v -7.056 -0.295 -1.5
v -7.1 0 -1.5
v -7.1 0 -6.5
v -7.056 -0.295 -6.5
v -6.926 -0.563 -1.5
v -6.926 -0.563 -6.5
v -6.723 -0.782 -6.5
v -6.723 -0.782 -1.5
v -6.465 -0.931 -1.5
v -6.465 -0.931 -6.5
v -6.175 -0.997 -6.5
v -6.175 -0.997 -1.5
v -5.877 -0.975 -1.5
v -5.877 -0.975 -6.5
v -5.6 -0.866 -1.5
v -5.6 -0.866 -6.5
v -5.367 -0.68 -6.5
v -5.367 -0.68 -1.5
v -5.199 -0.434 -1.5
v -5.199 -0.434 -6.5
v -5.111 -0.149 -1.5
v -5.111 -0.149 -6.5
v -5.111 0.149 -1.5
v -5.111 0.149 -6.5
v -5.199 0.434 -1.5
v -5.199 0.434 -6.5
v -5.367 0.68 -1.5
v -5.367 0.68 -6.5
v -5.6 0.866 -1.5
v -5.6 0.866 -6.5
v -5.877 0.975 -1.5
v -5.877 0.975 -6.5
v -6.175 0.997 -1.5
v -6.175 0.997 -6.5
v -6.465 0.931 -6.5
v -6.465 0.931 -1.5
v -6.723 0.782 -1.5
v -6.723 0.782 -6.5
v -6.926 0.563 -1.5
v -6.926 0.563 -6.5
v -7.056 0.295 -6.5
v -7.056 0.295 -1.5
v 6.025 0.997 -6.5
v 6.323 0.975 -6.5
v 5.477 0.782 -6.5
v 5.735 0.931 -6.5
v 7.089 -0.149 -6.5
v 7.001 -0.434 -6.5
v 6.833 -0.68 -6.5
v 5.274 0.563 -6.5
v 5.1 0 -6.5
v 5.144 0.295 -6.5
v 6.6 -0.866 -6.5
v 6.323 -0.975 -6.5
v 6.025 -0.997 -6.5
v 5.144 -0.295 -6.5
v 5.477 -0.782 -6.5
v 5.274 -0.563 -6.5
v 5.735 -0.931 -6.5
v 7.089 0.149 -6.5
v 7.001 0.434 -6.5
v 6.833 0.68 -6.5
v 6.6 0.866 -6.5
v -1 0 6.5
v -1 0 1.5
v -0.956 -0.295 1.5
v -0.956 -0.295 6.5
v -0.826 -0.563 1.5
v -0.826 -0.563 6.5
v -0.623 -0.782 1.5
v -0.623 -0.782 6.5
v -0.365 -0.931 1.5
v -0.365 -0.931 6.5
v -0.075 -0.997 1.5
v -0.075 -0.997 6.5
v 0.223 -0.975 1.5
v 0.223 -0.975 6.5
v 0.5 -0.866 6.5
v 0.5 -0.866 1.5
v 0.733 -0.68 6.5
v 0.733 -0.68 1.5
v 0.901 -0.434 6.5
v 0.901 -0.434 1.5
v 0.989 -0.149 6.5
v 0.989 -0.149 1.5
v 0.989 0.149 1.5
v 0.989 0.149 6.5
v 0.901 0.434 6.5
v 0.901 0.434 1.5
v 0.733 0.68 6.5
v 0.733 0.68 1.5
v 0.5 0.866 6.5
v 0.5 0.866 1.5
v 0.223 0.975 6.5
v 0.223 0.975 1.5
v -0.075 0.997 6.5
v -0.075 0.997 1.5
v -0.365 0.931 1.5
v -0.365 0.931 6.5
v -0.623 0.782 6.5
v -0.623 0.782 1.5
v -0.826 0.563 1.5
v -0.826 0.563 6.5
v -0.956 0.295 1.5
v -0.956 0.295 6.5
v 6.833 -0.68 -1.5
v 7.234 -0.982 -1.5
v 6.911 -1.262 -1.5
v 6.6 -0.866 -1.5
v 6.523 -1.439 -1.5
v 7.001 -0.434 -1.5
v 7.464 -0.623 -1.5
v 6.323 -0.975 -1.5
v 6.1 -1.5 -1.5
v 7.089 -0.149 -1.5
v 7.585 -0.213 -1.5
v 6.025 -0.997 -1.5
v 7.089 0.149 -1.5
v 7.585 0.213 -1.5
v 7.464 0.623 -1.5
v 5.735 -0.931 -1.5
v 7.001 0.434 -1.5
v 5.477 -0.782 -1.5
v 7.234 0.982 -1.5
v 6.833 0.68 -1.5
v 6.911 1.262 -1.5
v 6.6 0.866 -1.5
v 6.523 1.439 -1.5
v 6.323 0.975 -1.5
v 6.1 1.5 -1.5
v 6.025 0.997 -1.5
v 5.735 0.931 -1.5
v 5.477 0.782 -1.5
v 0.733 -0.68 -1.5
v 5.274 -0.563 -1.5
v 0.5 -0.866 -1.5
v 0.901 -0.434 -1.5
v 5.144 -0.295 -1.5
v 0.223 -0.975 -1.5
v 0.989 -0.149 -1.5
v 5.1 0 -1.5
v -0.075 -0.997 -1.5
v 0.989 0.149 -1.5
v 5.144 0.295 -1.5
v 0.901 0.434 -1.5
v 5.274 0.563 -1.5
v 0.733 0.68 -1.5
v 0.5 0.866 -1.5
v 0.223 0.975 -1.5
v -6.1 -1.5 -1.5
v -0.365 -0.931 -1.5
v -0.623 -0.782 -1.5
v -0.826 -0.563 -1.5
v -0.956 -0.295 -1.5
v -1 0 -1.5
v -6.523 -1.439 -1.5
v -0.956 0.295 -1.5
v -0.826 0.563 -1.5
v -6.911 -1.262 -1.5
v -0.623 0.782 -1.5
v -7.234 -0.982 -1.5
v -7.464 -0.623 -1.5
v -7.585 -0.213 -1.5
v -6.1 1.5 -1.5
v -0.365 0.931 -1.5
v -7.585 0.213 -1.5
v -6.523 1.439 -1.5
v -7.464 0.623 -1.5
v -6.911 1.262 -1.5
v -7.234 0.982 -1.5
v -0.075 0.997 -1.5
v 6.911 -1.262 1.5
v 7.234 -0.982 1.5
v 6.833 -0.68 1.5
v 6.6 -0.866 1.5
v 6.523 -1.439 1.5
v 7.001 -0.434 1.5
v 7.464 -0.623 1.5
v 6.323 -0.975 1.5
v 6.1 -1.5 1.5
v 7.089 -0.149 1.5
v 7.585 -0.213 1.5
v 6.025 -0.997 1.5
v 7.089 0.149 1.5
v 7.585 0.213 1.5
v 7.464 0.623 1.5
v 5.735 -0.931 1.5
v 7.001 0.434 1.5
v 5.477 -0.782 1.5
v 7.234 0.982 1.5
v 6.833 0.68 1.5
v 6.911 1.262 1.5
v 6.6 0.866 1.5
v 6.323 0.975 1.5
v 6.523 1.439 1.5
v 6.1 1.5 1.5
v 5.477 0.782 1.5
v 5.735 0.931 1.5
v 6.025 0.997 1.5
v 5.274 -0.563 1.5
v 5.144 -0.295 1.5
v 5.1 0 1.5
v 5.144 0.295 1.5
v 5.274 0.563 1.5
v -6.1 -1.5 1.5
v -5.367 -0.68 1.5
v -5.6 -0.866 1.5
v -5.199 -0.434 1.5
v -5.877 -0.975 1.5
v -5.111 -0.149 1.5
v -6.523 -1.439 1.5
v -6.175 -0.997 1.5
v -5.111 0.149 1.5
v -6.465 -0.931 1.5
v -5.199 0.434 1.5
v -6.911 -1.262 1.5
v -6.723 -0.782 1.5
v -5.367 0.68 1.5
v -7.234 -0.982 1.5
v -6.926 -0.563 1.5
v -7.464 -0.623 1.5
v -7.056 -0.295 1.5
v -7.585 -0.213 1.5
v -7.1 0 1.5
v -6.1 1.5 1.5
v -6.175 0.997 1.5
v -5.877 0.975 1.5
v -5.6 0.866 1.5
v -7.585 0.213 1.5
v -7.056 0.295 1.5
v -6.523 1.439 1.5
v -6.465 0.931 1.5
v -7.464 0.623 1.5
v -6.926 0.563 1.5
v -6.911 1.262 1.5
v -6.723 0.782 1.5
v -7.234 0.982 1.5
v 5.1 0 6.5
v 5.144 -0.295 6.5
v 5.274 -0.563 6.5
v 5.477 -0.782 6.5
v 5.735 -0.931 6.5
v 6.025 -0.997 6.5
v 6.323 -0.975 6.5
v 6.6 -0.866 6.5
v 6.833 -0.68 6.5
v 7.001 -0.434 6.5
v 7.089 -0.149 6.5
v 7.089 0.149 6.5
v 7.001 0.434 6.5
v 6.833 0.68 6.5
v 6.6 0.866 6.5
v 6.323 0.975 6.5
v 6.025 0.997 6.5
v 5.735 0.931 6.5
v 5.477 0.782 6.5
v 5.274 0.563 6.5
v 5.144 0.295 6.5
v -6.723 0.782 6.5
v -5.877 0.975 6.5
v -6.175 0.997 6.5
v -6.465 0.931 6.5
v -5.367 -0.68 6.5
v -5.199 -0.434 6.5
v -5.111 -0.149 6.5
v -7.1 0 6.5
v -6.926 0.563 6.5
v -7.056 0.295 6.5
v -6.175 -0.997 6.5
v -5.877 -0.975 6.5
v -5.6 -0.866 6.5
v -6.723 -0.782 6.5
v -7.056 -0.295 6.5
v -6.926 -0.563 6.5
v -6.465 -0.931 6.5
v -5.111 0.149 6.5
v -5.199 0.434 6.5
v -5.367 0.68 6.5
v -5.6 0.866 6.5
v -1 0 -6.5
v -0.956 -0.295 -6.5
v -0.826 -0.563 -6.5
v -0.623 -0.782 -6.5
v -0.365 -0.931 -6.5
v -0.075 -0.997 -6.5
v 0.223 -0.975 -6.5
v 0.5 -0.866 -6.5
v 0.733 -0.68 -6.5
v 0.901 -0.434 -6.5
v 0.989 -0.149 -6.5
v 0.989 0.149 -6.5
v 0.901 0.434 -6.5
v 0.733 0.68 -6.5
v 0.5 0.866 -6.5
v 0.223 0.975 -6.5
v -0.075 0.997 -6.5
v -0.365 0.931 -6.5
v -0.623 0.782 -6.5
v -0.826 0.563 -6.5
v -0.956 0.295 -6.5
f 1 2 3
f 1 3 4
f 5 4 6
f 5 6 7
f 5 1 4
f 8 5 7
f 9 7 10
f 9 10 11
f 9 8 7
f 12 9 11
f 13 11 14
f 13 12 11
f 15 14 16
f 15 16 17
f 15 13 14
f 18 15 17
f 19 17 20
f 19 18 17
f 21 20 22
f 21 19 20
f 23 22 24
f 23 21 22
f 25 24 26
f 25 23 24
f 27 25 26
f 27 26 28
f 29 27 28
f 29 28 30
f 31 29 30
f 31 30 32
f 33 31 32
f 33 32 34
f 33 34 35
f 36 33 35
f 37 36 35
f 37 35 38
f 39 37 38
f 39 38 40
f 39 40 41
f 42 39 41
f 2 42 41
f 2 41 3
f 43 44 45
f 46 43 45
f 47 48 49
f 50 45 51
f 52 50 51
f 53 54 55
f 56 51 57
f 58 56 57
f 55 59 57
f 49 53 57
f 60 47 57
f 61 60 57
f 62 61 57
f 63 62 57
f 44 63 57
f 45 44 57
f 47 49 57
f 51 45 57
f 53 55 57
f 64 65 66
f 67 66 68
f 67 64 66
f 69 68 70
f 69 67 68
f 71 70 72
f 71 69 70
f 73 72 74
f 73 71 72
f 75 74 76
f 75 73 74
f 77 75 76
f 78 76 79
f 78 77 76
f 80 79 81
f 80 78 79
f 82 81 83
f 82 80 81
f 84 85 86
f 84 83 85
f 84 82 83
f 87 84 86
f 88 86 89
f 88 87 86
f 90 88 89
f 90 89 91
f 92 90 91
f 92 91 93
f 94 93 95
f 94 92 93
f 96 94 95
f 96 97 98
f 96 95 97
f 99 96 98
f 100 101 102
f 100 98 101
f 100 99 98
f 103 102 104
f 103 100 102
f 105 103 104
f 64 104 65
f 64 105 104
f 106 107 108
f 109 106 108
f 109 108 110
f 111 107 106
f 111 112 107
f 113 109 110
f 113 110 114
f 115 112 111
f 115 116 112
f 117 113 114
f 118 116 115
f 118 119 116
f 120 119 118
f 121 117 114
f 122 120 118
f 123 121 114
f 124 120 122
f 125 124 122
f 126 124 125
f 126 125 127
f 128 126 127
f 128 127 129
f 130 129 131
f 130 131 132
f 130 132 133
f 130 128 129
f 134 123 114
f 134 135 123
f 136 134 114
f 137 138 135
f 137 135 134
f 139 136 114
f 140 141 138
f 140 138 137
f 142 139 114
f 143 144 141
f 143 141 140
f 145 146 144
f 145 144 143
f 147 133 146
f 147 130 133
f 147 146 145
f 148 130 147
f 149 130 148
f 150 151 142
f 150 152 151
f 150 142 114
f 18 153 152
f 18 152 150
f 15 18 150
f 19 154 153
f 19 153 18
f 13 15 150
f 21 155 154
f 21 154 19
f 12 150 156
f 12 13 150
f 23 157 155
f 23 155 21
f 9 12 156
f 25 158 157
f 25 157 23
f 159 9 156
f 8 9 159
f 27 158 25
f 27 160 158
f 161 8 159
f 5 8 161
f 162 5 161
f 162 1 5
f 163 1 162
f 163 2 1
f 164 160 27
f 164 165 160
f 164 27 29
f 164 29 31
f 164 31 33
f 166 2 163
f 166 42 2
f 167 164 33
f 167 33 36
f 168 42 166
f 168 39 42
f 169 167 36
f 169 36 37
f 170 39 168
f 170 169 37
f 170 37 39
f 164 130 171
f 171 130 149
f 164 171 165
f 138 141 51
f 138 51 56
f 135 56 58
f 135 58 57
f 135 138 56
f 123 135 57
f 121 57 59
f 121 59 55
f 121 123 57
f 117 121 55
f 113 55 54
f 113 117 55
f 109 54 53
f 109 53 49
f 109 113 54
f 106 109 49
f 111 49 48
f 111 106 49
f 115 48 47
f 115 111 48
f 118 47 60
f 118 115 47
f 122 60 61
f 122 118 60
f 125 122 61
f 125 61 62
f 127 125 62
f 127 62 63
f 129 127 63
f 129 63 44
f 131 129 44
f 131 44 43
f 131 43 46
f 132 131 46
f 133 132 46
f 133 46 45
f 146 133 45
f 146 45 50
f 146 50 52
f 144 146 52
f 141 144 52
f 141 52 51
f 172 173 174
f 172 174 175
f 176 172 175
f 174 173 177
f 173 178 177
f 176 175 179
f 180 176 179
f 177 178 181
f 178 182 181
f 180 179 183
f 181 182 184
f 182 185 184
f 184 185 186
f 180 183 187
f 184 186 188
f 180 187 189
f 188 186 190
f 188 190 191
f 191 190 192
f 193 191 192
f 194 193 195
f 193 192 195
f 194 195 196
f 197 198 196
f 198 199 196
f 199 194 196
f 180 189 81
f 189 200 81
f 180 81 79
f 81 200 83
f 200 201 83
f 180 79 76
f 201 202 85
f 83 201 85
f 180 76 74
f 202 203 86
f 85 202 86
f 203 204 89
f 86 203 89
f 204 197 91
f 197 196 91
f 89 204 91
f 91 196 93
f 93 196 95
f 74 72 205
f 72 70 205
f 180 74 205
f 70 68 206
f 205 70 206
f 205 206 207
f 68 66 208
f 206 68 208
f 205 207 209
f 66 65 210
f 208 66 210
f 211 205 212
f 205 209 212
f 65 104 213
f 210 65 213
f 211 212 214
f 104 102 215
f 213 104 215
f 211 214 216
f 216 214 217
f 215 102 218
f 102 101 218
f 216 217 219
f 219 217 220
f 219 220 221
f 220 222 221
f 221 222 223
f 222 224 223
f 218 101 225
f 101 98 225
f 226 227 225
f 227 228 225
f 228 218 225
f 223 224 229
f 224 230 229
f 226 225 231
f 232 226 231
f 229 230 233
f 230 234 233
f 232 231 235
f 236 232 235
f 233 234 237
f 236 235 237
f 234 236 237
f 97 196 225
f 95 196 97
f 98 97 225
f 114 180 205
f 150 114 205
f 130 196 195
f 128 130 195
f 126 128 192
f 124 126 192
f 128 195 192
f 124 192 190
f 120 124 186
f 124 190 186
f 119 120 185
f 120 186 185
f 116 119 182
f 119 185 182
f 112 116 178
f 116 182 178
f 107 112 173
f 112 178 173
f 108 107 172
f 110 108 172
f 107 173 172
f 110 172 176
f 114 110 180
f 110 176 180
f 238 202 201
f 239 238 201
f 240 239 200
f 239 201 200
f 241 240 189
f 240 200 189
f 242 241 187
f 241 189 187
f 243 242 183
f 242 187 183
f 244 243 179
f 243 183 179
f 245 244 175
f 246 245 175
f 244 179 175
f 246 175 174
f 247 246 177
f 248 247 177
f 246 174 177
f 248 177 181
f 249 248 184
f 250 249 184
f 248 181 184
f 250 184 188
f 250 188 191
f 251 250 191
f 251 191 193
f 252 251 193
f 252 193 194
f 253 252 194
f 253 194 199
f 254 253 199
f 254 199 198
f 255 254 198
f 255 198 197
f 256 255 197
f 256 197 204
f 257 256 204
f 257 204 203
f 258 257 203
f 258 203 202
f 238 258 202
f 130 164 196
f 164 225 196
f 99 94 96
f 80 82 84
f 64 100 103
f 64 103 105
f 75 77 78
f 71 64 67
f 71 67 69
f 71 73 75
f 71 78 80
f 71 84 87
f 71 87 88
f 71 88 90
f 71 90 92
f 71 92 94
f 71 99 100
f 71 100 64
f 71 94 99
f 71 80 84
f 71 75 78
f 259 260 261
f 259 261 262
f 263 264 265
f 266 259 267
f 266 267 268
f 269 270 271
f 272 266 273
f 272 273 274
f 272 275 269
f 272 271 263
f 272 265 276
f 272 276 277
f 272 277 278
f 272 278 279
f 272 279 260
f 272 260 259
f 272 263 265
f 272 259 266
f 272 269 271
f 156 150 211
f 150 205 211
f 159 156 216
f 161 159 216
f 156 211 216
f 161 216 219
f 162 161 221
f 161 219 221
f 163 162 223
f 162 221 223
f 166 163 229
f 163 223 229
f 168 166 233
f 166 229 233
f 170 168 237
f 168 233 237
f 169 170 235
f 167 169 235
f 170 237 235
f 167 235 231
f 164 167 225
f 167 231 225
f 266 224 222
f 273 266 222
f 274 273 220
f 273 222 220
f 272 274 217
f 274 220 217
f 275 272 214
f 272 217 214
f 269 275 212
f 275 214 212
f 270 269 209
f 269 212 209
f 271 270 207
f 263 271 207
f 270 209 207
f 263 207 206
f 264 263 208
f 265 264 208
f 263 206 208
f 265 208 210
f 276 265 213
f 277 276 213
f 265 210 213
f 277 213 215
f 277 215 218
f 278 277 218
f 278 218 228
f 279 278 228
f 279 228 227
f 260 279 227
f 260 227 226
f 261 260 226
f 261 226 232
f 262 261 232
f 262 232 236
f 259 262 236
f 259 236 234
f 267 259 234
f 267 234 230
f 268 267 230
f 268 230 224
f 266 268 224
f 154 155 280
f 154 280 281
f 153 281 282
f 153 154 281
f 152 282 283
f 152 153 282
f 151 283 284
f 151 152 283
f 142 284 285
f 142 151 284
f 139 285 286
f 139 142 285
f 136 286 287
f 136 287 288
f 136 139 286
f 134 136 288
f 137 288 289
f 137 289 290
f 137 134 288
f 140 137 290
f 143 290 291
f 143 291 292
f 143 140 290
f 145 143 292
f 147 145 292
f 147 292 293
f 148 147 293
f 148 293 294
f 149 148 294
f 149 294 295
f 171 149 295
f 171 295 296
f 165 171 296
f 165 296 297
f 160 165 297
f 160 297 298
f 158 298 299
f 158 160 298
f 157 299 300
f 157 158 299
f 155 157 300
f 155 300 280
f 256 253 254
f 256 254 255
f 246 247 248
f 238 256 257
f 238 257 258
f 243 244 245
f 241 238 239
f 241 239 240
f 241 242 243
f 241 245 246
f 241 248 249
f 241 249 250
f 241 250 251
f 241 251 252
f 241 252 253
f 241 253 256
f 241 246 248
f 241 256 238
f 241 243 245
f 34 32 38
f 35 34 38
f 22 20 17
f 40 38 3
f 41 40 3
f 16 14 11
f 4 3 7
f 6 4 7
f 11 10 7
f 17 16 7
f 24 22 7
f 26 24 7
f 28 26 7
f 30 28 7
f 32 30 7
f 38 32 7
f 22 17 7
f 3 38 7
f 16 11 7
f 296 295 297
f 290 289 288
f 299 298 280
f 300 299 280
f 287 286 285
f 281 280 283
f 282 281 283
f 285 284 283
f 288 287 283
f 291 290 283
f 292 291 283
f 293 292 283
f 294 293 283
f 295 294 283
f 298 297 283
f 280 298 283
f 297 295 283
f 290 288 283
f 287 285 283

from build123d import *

# Parameters (mm, degrees)
SKETCH1_R           = 1
BOSS_EXTRUDE1_DEPTH = 1.5
SKETCH1_3_R         = 1
BOSS_EXTRUDE2_DEPTH = 6.5


with BuildPart() as part:
    # Sketch1 → Boss-Extrude1 (new, symmetric)
    with BuildSketch(Plane.XY):
        with BuildLine():
            Line((-6.1, -1.5), (6.1, -1.5))
            ThreePointArc((6.1, -1.5), (7.6, 0), (6.1, 1.5))
            Line((6.1, 1.5), (-6.1, 1.5))
            ThreePointArc((-6.1, 1.5), (-7.6, 0), (-6.1, -1.5))
        make_face()
        Circle(SKETCH1_R, mode=Mode.SUBTRACT)
    extrude(amount=BOSS_EXTRUDE1_DEPTH, both=True)

    # Sketch1<3> → Boss-Extrude2 (add, symmetric)
    with BuildSketch(Plane.XY):
        with Locations((-6.1, 0)):
            Circle(SKETCH1_3_R)
        with Locations((6.1, 0)):
            Circle(SKETCH1_3_R)
        Circle(SKETCH1_3_R)
    extrude(amount=BOSS_EXTRUDE2_DEPTH, both=True)


solid = part.part
